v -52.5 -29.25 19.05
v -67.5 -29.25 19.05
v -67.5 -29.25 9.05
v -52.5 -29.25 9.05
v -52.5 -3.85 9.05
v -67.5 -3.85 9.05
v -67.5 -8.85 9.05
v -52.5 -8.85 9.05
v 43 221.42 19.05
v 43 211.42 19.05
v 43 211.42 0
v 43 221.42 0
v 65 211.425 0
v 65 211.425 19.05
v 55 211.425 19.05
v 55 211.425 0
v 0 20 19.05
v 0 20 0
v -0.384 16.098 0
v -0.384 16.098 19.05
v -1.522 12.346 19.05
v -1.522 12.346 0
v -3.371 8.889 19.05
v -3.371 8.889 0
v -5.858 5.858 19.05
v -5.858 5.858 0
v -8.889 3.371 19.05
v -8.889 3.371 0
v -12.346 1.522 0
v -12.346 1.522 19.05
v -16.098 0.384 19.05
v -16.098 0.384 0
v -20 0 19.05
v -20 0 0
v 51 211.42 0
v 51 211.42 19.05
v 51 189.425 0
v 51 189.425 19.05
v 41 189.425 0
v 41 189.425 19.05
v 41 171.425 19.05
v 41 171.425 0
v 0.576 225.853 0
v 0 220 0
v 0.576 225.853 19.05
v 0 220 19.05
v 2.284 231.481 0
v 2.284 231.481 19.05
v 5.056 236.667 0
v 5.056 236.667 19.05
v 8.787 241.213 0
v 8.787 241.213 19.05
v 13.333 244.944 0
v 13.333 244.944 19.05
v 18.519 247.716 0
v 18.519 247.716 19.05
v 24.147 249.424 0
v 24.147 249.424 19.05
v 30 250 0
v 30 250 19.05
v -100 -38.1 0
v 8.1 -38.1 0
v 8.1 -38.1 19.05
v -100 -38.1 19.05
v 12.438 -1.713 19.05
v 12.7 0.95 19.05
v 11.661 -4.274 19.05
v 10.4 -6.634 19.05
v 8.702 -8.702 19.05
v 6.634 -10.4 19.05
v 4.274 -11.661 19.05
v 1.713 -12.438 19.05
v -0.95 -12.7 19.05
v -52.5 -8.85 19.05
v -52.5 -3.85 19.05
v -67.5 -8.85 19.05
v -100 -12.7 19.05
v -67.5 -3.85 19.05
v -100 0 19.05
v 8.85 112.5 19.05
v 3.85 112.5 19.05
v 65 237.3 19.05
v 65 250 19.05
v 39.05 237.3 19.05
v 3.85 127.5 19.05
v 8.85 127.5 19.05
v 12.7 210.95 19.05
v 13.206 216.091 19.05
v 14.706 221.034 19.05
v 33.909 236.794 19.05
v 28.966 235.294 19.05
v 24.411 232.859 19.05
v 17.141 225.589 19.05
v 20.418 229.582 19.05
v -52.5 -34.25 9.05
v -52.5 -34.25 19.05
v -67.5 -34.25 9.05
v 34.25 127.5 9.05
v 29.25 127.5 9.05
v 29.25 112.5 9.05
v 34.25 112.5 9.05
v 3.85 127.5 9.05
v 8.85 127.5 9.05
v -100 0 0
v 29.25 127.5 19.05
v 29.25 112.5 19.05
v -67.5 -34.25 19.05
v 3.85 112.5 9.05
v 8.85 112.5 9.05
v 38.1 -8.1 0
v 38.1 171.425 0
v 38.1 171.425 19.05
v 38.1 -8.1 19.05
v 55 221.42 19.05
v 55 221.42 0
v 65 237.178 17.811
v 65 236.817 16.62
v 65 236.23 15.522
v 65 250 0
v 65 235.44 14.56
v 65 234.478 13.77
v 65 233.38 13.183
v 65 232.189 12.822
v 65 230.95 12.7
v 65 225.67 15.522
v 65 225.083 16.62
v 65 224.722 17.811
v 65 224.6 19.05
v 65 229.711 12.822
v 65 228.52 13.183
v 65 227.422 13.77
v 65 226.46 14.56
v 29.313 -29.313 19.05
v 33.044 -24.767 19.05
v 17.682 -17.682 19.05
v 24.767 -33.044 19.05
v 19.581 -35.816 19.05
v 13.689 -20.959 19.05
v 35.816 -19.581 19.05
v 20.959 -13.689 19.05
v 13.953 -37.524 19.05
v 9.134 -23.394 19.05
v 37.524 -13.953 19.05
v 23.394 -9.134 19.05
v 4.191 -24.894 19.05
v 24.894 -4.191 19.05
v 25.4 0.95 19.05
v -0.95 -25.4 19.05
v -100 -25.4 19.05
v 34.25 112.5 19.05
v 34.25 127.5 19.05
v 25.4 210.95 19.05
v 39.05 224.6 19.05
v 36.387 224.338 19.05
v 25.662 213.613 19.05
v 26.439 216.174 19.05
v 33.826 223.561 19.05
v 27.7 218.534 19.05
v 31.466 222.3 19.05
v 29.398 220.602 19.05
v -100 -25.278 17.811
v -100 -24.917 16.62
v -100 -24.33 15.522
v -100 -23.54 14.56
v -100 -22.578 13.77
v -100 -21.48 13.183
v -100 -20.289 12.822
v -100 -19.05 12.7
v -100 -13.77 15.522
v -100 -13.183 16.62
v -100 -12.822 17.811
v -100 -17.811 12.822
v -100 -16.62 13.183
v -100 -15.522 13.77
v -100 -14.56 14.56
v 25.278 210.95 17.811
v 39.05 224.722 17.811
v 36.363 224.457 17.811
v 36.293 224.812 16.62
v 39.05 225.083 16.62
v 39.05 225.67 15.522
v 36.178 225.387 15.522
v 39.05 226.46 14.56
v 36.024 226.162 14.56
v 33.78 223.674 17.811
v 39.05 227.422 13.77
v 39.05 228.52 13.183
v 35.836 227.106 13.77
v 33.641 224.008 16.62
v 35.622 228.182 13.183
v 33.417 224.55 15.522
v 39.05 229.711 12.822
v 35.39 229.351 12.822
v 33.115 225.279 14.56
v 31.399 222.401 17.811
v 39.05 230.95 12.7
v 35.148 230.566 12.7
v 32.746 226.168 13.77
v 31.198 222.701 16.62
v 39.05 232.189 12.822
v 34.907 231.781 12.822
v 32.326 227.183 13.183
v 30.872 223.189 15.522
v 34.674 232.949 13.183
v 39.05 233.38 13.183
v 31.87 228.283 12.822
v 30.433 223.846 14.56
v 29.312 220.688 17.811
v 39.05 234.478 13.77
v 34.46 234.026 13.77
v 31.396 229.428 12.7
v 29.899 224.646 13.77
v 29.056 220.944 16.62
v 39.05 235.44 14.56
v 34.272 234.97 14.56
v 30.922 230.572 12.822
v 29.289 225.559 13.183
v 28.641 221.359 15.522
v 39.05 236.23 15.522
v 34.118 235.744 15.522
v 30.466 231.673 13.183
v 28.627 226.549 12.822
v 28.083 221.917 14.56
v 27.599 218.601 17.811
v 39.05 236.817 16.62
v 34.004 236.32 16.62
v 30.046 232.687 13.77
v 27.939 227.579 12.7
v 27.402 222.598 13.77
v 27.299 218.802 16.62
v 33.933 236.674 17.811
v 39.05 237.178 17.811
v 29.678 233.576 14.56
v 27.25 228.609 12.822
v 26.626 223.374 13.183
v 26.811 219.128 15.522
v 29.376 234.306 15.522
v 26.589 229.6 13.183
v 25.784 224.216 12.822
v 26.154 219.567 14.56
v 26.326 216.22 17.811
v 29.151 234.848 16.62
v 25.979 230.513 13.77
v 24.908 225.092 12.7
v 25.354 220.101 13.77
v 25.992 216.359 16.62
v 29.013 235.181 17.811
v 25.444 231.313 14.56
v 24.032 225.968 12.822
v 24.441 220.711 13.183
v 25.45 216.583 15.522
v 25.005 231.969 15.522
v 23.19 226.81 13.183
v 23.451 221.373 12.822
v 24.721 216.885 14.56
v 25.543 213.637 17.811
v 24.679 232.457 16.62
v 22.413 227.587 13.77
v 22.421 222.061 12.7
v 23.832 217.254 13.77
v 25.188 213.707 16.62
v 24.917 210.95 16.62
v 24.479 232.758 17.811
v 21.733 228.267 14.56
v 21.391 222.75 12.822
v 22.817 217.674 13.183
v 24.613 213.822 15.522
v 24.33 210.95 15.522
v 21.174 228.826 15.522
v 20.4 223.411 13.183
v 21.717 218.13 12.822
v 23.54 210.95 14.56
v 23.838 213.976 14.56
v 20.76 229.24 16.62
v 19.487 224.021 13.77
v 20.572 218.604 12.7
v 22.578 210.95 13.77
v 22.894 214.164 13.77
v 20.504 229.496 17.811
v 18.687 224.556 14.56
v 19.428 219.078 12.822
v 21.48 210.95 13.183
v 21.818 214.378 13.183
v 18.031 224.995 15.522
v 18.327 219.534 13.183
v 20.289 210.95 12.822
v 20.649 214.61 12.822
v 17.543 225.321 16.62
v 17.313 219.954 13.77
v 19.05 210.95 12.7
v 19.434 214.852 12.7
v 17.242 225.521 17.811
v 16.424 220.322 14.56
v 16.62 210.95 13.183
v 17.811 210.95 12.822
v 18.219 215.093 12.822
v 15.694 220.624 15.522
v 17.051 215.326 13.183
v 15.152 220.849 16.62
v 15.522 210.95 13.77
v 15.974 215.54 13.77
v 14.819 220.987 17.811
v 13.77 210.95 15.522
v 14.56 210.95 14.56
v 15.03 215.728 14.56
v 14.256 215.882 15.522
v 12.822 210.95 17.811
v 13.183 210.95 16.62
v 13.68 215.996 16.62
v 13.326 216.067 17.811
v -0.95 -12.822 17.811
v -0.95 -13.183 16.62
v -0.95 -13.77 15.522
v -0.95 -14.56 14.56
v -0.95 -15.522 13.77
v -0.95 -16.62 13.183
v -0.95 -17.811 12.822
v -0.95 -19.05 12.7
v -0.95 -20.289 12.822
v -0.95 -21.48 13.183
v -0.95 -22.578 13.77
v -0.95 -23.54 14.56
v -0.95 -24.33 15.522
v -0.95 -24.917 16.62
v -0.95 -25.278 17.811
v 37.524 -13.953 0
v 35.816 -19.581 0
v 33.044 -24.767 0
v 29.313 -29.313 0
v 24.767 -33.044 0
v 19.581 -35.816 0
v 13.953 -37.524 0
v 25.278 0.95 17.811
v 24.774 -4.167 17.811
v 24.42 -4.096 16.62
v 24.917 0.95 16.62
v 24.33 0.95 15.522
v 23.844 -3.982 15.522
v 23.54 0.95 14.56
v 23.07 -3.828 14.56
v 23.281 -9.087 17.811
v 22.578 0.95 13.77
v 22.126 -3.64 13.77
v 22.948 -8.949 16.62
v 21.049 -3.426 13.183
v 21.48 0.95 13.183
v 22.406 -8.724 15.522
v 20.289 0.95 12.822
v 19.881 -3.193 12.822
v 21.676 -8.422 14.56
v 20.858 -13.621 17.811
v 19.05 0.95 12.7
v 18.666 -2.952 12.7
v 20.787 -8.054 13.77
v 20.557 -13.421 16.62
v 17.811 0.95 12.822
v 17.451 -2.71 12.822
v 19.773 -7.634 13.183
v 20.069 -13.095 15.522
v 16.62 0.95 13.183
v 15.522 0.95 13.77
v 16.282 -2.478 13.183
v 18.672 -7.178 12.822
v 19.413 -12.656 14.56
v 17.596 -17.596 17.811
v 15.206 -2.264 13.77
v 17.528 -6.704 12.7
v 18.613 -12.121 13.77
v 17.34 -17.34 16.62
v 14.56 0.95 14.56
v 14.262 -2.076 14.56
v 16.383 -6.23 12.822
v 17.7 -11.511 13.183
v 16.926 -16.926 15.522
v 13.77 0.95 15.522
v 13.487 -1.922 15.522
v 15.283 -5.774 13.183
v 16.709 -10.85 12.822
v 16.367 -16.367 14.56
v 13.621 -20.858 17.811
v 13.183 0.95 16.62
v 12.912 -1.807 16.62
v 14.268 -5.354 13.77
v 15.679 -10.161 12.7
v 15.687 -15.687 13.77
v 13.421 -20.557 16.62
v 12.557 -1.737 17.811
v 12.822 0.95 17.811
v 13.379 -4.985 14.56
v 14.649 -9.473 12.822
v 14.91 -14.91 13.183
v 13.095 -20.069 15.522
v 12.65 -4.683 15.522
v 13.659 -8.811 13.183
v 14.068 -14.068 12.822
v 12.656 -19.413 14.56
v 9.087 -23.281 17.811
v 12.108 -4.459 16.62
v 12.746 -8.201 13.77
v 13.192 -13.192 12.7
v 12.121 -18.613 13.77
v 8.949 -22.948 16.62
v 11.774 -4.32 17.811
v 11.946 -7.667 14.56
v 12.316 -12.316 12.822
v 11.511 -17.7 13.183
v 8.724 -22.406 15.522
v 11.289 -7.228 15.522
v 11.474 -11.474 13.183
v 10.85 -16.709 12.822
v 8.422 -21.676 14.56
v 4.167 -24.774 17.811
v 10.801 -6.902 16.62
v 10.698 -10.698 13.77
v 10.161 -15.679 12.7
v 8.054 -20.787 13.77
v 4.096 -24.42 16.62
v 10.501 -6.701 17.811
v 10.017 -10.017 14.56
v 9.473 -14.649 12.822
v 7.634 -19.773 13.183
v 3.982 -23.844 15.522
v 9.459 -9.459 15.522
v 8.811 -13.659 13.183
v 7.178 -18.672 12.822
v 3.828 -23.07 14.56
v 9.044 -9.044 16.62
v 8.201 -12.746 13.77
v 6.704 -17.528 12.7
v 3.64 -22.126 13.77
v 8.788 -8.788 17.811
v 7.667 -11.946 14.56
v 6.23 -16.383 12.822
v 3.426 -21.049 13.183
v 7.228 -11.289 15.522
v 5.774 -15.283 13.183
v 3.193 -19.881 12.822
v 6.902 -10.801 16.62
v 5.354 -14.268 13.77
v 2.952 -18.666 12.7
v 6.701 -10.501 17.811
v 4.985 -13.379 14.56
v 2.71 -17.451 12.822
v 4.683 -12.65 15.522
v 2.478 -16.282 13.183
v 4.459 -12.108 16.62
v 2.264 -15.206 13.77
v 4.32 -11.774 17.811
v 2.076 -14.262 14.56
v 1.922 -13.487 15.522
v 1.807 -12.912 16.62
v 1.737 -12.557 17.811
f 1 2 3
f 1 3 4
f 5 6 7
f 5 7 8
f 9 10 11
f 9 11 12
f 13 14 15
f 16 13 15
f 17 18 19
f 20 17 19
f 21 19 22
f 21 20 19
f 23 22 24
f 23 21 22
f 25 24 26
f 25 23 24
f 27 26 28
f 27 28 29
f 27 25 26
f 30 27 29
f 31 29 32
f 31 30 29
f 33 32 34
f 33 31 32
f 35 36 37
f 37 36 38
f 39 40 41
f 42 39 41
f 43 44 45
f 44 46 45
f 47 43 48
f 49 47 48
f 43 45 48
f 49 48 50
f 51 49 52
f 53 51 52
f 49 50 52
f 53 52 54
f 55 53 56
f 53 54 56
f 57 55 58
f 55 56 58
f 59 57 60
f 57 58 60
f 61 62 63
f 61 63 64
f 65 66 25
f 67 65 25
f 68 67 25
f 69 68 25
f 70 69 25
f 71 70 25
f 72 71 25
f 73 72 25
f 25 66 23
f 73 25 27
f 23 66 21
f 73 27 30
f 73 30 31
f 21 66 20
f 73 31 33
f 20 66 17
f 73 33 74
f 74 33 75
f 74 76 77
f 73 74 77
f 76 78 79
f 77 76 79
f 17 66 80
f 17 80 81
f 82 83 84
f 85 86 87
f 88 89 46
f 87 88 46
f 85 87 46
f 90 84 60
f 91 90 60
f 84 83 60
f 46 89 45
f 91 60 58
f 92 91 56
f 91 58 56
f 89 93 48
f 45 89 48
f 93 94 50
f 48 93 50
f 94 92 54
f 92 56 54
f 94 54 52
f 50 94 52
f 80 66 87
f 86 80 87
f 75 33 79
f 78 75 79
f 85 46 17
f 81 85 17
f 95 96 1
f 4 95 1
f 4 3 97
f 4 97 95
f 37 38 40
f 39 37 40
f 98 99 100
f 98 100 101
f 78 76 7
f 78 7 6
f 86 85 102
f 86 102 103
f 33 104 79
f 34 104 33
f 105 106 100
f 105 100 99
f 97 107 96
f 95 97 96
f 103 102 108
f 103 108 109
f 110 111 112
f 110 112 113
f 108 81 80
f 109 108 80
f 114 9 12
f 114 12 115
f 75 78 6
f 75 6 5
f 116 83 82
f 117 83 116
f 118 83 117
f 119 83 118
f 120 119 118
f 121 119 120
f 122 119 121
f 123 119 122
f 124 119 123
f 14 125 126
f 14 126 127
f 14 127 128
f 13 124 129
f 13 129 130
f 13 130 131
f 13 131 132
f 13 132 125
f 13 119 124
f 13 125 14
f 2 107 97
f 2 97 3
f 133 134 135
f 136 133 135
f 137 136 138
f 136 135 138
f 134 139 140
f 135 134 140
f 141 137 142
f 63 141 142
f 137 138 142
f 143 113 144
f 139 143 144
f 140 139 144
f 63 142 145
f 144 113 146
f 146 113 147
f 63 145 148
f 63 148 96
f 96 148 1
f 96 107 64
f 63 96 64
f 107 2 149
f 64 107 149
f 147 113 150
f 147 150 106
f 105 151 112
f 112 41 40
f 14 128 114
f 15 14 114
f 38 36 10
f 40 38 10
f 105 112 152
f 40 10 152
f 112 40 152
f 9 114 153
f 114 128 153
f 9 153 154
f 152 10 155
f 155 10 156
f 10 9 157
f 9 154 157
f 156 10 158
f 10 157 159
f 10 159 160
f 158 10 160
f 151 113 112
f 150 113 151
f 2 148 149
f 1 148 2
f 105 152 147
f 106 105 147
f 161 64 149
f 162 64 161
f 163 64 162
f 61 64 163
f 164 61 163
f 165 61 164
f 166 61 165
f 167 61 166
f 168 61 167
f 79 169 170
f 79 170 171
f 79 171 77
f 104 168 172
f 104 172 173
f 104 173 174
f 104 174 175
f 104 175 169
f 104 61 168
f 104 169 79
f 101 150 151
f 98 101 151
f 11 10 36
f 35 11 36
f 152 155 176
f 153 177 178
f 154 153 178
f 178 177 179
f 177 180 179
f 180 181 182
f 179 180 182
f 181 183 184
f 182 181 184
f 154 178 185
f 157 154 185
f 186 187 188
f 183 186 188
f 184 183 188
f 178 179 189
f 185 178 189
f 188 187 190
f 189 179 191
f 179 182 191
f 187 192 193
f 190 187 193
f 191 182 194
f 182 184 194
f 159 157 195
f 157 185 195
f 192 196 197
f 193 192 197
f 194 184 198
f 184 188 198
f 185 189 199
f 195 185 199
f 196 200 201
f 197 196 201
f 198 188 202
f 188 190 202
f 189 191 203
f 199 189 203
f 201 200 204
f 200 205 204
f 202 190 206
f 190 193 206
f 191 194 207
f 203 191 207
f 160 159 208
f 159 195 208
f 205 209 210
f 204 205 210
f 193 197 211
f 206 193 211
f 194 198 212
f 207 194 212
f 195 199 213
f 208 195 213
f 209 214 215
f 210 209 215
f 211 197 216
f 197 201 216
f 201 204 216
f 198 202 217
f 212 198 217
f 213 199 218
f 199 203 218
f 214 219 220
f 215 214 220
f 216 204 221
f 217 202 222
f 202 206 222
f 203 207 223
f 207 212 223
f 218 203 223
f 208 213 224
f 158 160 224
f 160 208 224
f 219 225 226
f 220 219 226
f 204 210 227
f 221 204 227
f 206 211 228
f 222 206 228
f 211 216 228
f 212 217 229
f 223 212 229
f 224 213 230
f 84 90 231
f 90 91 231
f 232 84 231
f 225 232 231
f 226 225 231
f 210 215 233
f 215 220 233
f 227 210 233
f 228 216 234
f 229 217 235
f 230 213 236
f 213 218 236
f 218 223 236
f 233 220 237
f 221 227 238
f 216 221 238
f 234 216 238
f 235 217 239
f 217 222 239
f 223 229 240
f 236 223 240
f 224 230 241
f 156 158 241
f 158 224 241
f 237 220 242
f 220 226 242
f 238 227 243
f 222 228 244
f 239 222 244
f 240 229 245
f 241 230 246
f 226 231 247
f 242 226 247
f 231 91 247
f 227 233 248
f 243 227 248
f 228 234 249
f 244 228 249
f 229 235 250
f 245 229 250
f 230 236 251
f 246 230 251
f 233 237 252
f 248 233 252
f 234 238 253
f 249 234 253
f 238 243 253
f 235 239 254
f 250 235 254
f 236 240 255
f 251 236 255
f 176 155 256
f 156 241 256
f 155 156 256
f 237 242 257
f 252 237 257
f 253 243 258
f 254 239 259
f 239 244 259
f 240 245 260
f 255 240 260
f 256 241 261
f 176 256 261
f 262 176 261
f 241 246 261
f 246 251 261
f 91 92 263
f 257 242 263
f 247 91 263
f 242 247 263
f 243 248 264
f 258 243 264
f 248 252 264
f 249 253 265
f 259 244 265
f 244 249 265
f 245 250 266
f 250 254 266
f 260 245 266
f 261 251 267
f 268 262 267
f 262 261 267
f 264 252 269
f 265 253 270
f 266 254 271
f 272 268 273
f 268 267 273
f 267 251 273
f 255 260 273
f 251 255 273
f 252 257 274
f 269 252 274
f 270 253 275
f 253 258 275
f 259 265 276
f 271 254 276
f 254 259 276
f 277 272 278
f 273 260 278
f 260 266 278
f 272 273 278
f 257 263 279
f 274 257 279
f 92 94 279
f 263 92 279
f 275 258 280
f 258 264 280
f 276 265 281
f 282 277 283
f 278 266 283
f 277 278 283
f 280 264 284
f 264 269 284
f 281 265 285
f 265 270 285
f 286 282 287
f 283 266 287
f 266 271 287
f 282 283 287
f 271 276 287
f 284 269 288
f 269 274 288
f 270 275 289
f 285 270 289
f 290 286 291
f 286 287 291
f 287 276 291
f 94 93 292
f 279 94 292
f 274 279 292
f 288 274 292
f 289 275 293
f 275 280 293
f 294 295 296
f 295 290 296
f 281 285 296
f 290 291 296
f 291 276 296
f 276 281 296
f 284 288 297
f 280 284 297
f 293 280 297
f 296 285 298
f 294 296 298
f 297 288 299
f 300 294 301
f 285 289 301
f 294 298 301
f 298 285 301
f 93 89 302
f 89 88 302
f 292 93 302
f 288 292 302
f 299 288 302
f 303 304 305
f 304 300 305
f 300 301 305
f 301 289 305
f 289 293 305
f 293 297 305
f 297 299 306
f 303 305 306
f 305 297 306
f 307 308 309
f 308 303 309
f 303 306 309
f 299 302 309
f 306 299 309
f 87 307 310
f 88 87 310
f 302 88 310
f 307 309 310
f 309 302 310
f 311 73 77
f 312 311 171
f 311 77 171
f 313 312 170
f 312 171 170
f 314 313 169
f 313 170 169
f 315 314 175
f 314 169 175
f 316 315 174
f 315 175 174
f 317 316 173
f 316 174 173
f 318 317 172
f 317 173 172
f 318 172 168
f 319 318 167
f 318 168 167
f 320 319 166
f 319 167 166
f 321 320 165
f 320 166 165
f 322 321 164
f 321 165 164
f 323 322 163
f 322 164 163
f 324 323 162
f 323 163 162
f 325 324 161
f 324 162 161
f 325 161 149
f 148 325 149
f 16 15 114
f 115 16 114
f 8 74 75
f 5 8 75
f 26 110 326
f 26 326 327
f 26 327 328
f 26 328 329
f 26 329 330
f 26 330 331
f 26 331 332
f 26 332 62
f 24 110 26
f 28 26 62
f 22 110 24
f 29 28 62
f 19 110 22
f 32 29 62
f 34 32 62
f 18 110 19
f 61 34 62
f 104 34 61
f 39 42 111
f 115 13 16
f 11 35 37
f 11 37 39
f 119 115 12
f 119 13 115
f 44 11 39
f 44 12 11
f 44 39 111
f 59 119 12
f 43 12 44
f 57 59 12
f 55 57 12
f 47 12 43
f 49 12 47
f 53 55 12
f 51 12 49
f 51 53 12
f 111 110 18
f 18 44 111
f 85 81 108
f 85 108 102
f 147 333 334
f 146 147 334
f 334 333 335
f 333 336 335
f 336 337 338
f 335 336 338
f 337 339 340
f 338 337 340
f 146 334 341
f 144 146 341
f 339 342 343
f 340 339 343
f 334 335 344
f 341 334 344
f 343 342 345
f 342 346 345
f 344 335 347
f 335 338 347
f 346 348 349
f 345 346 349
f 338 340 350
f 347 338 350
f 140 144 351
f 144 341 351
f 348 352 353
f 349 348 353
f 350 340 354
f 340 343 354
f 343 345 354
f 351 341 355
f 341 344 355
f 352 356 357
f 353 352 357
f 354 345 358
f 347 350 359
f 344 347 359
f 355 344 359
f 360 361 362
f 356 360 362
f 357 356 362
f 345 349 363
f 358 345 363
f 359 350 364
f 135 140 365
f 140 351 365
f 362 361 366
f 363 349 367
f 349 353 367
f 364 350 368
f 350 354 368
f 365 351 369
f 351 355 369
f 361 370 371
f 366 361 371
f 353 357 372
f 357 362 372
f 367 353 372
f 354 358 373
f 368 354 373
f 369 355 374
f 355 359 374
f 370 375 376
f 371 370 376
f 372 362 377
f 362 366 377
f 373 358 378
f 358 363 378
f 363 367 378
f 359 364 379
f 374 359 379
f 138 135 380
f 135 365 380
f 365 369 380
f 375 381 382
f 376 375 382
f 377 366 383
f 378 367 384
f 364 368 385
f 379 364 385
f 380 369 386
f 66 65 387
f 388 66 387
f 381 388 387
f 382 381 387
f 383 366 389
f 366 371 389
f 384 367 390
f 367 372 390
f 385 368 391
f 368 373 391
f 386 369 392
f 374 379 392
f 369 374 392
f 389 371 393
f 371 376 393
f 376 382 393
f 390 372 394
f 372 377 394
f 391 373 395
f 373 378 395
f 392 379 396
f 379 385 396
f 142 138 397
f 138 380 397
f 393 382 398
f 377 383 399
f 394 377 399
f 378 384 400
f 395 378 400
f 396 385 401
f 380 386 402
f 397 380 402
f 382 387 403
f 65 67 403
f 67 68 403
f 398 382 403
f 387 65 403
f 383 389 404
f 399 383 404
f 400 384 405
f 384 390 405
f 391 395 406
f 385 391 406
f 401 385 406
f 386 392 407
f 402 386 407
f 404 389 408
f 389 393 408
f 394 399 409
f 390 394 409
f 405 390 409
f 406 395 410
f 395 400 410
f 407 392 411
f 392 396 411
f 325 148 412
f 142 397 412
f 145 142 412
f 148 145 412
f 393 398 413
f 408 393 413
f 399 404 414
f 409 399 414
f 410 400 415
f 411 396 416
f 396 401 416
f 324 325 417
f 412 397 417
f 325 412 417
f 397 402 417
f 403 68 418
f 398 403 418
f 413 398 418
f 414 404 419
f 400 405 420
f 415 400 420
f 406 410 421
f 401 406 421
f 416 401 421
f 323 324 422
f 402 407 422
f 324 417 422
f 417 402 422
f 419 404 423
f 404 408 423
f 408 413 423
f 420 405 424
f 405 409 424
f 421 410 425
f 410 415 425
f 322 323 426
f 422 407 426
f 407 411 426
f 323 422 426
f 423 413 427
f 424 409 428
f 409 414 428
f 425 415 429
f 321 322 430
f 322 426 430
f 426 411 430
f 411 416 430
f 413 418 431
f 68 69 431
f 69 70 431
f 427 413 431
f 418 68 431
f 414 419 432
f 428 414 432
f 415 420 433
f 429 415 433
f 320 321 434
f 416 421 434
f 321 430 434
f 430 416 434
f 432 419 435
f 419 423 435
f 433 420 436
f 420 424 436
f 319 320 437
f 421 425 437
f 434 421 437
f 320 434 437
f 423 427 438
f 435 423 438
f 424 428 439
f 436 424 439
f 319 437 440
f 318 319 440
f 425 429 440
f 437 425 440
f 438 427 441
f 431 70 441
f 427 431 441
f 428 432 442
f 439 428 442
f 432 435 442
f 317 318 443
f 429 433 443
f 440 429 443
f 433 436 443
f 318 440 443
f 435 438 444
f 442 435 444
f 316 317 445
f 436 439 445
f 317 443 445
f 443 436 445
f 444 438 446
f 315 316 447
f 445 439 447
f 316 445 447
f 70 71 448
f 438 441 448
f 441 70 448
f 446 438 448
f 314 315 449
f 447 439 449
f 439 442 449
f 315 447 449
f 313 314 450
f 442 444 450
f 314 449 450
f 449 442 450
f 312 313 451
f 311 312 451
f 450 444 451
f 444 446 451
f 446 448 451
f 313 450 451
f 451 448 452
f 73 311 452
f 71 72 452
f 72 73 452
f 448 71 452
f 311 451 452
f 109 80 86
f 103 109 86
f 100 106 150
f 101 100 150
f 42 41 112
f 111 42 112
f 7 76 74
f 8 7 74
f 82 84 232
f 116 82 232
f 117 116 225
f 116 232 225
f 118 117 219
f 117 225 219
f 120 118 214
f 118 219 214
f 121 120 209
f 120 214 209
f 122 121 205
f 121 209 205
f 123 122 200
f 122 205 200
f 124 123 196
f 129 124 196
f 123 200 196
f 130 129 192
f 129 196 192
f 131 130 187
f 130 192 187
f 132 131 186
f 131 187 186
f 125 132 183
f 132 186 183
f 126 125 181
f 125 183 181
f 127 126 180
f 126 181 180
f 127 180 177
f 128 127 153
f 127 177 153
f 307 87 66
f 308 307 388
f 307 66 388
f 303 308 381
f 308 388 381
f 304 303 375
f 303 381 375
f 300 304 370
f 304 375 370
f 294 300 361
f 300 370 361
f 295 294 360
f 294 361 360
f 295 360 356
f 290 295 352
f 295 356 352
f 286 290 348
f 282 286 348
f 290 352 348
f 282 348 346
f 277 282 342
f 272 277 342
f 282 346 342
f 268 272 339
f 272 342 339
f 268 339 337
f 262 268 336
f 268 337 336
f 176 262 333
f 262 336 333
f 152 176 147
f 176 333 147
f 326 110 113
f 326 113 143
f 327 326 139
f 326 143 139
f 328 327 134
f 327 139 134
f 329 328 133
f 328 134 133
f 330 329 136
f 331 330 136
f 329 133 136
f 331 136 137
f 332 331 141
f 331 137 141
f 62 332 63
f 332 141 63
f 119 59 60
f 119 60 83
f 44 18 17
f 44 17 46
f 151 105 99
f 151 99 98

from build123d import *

# Parameters (mm, degrees)
BOSS_EXTRUDE1_DEPTH  = 19.05
FILLET1_R            = 30
FILLET2_R            = 20
BOSS_EXTRUDE3_DEPTH  = 19.05
SKETCH14_W           = 12
SKETCH14_H           = 10
CUT_EXTRUDE1_DEPTH   = 39
CUT_SWEEP1_PROFILE_R = 6.35
SKETCH24_W           = 5
SKETCH24_H           = 15
SKETCH24_W_2         = 15
SKETCH24_H_2         = 5
CUT_EXTRUDE2_DEPTH   = 10


with BuildPart() as part:
    # Sketch1 → Boss-Extrude1 (new body)
    with BuildSketch(Plane.XY):
        Polygon((-100, 0), (0, 0), (0, 250), (65, 250), (65, 211.9), (38.1, 211.9), (38.1, -38.1), (-100, -38.1), align=None)
    extrude(amount=BOSS_EXTRUDE1_DEPTH)

    # Fillet1
    fillet1_edges = [part.edges().sort_by_distance(p)[0] for p in [
        (0, 250, 9.525),
        (38.1, -38.1, 9.525),
    ]]
    fillet(fillet1_edges, radius=FILLET1_R)

    # Fillet2
    fillet2_edges = [part.edges().sort_by_distance(p)[0] for p in [
        (0, 0, 9.525),
    ]]
    fillet(fillet2_edges, radius=FILLET2_R)

    # Sketch13 → Boss-Extrude3 (add)
    with BuildSketch(Plane.XY.offset(19.05)):
        Polygon((55, 221.425), (43, 221.425), (43, 211.425), (51, 211.425), (51, 189.425), (41, 189.425), (41, 171.425), (36.549895251, 171.425), (36.549895251, 223.572995821), (65, 223.572995821), (65, 211.9), (65, 211.425), (55, 211.425), align=None)
    extrude(amount=-BOSS_EXTRUDE3_DEPTH)

    # Sketch14 → Cut-Extrude1 (cut)
    with BuildSketch(Plane.XY.offset(19.05)):
        with Locations((49, 216.42)):
            Rectangle(SKETCH14_W, SKETCH14_H)
    extrude(amount=-CUT_EXTRUDE1_DEPTH, mode=Mode.SUBTRACT)

    # Cut-Sweep1: sweep along a path in Sketch17
    with BuildLine(Plane.XY.offset(19.05)) as cut_sweep1_path:
        Line((65, 230.95), (39.05, 230.95))
        ThreePointArc((39.05, 230.95), (24.907864376, 225.092135624), (19.05, 210.95))
        Line((19.05, 210.95), (19.05, 0.95))
        ThreePointArc((19.05, 0.95), (13.192135624, -13.192135624), (-0.95, -19.05))
        Line((-0.95, -19.05), (-100, -19.05))
    # Cut-Sweep1 profile (on start of the path) → Cut-Sweep1 (sweep, cut)
    with BuildSketch(Plane(origin=(65, 230.95, 19.05), x_dir=(0, 0, -1), z_dir=(-1, 0, 0))):
        Circle(CUT_SWEEP1_PROFILE_R)
    sweep(path=cut_sweep1_path.line, mode=Mode.SUBTRACT)

    # Sketch24 → Cut-Extrude2 (cut)
    with BuildSketch(Plane.XY.offset(19.05)):
        with Locations((6.35, 120)):
            Rectangle(SKETCH24_W, SKETCH24_H)
        with Locations((-60, -6.35)):
            Rectangle(SKETCH24_W_2, SKETCH24_H_2)
        with Locations((31.75, 120)):
            Rectangle(SKETCH24_W, SKETCH24_H)
        with Locations((-60, -31.75)):
            Rectangle(SKETCH24_W_2, SKETCH24_H_2)
    extrude(amount=-CUT_EXTRUDE2_DEPTH, mode=Mode.SUBTRACT)


solid = part.part
